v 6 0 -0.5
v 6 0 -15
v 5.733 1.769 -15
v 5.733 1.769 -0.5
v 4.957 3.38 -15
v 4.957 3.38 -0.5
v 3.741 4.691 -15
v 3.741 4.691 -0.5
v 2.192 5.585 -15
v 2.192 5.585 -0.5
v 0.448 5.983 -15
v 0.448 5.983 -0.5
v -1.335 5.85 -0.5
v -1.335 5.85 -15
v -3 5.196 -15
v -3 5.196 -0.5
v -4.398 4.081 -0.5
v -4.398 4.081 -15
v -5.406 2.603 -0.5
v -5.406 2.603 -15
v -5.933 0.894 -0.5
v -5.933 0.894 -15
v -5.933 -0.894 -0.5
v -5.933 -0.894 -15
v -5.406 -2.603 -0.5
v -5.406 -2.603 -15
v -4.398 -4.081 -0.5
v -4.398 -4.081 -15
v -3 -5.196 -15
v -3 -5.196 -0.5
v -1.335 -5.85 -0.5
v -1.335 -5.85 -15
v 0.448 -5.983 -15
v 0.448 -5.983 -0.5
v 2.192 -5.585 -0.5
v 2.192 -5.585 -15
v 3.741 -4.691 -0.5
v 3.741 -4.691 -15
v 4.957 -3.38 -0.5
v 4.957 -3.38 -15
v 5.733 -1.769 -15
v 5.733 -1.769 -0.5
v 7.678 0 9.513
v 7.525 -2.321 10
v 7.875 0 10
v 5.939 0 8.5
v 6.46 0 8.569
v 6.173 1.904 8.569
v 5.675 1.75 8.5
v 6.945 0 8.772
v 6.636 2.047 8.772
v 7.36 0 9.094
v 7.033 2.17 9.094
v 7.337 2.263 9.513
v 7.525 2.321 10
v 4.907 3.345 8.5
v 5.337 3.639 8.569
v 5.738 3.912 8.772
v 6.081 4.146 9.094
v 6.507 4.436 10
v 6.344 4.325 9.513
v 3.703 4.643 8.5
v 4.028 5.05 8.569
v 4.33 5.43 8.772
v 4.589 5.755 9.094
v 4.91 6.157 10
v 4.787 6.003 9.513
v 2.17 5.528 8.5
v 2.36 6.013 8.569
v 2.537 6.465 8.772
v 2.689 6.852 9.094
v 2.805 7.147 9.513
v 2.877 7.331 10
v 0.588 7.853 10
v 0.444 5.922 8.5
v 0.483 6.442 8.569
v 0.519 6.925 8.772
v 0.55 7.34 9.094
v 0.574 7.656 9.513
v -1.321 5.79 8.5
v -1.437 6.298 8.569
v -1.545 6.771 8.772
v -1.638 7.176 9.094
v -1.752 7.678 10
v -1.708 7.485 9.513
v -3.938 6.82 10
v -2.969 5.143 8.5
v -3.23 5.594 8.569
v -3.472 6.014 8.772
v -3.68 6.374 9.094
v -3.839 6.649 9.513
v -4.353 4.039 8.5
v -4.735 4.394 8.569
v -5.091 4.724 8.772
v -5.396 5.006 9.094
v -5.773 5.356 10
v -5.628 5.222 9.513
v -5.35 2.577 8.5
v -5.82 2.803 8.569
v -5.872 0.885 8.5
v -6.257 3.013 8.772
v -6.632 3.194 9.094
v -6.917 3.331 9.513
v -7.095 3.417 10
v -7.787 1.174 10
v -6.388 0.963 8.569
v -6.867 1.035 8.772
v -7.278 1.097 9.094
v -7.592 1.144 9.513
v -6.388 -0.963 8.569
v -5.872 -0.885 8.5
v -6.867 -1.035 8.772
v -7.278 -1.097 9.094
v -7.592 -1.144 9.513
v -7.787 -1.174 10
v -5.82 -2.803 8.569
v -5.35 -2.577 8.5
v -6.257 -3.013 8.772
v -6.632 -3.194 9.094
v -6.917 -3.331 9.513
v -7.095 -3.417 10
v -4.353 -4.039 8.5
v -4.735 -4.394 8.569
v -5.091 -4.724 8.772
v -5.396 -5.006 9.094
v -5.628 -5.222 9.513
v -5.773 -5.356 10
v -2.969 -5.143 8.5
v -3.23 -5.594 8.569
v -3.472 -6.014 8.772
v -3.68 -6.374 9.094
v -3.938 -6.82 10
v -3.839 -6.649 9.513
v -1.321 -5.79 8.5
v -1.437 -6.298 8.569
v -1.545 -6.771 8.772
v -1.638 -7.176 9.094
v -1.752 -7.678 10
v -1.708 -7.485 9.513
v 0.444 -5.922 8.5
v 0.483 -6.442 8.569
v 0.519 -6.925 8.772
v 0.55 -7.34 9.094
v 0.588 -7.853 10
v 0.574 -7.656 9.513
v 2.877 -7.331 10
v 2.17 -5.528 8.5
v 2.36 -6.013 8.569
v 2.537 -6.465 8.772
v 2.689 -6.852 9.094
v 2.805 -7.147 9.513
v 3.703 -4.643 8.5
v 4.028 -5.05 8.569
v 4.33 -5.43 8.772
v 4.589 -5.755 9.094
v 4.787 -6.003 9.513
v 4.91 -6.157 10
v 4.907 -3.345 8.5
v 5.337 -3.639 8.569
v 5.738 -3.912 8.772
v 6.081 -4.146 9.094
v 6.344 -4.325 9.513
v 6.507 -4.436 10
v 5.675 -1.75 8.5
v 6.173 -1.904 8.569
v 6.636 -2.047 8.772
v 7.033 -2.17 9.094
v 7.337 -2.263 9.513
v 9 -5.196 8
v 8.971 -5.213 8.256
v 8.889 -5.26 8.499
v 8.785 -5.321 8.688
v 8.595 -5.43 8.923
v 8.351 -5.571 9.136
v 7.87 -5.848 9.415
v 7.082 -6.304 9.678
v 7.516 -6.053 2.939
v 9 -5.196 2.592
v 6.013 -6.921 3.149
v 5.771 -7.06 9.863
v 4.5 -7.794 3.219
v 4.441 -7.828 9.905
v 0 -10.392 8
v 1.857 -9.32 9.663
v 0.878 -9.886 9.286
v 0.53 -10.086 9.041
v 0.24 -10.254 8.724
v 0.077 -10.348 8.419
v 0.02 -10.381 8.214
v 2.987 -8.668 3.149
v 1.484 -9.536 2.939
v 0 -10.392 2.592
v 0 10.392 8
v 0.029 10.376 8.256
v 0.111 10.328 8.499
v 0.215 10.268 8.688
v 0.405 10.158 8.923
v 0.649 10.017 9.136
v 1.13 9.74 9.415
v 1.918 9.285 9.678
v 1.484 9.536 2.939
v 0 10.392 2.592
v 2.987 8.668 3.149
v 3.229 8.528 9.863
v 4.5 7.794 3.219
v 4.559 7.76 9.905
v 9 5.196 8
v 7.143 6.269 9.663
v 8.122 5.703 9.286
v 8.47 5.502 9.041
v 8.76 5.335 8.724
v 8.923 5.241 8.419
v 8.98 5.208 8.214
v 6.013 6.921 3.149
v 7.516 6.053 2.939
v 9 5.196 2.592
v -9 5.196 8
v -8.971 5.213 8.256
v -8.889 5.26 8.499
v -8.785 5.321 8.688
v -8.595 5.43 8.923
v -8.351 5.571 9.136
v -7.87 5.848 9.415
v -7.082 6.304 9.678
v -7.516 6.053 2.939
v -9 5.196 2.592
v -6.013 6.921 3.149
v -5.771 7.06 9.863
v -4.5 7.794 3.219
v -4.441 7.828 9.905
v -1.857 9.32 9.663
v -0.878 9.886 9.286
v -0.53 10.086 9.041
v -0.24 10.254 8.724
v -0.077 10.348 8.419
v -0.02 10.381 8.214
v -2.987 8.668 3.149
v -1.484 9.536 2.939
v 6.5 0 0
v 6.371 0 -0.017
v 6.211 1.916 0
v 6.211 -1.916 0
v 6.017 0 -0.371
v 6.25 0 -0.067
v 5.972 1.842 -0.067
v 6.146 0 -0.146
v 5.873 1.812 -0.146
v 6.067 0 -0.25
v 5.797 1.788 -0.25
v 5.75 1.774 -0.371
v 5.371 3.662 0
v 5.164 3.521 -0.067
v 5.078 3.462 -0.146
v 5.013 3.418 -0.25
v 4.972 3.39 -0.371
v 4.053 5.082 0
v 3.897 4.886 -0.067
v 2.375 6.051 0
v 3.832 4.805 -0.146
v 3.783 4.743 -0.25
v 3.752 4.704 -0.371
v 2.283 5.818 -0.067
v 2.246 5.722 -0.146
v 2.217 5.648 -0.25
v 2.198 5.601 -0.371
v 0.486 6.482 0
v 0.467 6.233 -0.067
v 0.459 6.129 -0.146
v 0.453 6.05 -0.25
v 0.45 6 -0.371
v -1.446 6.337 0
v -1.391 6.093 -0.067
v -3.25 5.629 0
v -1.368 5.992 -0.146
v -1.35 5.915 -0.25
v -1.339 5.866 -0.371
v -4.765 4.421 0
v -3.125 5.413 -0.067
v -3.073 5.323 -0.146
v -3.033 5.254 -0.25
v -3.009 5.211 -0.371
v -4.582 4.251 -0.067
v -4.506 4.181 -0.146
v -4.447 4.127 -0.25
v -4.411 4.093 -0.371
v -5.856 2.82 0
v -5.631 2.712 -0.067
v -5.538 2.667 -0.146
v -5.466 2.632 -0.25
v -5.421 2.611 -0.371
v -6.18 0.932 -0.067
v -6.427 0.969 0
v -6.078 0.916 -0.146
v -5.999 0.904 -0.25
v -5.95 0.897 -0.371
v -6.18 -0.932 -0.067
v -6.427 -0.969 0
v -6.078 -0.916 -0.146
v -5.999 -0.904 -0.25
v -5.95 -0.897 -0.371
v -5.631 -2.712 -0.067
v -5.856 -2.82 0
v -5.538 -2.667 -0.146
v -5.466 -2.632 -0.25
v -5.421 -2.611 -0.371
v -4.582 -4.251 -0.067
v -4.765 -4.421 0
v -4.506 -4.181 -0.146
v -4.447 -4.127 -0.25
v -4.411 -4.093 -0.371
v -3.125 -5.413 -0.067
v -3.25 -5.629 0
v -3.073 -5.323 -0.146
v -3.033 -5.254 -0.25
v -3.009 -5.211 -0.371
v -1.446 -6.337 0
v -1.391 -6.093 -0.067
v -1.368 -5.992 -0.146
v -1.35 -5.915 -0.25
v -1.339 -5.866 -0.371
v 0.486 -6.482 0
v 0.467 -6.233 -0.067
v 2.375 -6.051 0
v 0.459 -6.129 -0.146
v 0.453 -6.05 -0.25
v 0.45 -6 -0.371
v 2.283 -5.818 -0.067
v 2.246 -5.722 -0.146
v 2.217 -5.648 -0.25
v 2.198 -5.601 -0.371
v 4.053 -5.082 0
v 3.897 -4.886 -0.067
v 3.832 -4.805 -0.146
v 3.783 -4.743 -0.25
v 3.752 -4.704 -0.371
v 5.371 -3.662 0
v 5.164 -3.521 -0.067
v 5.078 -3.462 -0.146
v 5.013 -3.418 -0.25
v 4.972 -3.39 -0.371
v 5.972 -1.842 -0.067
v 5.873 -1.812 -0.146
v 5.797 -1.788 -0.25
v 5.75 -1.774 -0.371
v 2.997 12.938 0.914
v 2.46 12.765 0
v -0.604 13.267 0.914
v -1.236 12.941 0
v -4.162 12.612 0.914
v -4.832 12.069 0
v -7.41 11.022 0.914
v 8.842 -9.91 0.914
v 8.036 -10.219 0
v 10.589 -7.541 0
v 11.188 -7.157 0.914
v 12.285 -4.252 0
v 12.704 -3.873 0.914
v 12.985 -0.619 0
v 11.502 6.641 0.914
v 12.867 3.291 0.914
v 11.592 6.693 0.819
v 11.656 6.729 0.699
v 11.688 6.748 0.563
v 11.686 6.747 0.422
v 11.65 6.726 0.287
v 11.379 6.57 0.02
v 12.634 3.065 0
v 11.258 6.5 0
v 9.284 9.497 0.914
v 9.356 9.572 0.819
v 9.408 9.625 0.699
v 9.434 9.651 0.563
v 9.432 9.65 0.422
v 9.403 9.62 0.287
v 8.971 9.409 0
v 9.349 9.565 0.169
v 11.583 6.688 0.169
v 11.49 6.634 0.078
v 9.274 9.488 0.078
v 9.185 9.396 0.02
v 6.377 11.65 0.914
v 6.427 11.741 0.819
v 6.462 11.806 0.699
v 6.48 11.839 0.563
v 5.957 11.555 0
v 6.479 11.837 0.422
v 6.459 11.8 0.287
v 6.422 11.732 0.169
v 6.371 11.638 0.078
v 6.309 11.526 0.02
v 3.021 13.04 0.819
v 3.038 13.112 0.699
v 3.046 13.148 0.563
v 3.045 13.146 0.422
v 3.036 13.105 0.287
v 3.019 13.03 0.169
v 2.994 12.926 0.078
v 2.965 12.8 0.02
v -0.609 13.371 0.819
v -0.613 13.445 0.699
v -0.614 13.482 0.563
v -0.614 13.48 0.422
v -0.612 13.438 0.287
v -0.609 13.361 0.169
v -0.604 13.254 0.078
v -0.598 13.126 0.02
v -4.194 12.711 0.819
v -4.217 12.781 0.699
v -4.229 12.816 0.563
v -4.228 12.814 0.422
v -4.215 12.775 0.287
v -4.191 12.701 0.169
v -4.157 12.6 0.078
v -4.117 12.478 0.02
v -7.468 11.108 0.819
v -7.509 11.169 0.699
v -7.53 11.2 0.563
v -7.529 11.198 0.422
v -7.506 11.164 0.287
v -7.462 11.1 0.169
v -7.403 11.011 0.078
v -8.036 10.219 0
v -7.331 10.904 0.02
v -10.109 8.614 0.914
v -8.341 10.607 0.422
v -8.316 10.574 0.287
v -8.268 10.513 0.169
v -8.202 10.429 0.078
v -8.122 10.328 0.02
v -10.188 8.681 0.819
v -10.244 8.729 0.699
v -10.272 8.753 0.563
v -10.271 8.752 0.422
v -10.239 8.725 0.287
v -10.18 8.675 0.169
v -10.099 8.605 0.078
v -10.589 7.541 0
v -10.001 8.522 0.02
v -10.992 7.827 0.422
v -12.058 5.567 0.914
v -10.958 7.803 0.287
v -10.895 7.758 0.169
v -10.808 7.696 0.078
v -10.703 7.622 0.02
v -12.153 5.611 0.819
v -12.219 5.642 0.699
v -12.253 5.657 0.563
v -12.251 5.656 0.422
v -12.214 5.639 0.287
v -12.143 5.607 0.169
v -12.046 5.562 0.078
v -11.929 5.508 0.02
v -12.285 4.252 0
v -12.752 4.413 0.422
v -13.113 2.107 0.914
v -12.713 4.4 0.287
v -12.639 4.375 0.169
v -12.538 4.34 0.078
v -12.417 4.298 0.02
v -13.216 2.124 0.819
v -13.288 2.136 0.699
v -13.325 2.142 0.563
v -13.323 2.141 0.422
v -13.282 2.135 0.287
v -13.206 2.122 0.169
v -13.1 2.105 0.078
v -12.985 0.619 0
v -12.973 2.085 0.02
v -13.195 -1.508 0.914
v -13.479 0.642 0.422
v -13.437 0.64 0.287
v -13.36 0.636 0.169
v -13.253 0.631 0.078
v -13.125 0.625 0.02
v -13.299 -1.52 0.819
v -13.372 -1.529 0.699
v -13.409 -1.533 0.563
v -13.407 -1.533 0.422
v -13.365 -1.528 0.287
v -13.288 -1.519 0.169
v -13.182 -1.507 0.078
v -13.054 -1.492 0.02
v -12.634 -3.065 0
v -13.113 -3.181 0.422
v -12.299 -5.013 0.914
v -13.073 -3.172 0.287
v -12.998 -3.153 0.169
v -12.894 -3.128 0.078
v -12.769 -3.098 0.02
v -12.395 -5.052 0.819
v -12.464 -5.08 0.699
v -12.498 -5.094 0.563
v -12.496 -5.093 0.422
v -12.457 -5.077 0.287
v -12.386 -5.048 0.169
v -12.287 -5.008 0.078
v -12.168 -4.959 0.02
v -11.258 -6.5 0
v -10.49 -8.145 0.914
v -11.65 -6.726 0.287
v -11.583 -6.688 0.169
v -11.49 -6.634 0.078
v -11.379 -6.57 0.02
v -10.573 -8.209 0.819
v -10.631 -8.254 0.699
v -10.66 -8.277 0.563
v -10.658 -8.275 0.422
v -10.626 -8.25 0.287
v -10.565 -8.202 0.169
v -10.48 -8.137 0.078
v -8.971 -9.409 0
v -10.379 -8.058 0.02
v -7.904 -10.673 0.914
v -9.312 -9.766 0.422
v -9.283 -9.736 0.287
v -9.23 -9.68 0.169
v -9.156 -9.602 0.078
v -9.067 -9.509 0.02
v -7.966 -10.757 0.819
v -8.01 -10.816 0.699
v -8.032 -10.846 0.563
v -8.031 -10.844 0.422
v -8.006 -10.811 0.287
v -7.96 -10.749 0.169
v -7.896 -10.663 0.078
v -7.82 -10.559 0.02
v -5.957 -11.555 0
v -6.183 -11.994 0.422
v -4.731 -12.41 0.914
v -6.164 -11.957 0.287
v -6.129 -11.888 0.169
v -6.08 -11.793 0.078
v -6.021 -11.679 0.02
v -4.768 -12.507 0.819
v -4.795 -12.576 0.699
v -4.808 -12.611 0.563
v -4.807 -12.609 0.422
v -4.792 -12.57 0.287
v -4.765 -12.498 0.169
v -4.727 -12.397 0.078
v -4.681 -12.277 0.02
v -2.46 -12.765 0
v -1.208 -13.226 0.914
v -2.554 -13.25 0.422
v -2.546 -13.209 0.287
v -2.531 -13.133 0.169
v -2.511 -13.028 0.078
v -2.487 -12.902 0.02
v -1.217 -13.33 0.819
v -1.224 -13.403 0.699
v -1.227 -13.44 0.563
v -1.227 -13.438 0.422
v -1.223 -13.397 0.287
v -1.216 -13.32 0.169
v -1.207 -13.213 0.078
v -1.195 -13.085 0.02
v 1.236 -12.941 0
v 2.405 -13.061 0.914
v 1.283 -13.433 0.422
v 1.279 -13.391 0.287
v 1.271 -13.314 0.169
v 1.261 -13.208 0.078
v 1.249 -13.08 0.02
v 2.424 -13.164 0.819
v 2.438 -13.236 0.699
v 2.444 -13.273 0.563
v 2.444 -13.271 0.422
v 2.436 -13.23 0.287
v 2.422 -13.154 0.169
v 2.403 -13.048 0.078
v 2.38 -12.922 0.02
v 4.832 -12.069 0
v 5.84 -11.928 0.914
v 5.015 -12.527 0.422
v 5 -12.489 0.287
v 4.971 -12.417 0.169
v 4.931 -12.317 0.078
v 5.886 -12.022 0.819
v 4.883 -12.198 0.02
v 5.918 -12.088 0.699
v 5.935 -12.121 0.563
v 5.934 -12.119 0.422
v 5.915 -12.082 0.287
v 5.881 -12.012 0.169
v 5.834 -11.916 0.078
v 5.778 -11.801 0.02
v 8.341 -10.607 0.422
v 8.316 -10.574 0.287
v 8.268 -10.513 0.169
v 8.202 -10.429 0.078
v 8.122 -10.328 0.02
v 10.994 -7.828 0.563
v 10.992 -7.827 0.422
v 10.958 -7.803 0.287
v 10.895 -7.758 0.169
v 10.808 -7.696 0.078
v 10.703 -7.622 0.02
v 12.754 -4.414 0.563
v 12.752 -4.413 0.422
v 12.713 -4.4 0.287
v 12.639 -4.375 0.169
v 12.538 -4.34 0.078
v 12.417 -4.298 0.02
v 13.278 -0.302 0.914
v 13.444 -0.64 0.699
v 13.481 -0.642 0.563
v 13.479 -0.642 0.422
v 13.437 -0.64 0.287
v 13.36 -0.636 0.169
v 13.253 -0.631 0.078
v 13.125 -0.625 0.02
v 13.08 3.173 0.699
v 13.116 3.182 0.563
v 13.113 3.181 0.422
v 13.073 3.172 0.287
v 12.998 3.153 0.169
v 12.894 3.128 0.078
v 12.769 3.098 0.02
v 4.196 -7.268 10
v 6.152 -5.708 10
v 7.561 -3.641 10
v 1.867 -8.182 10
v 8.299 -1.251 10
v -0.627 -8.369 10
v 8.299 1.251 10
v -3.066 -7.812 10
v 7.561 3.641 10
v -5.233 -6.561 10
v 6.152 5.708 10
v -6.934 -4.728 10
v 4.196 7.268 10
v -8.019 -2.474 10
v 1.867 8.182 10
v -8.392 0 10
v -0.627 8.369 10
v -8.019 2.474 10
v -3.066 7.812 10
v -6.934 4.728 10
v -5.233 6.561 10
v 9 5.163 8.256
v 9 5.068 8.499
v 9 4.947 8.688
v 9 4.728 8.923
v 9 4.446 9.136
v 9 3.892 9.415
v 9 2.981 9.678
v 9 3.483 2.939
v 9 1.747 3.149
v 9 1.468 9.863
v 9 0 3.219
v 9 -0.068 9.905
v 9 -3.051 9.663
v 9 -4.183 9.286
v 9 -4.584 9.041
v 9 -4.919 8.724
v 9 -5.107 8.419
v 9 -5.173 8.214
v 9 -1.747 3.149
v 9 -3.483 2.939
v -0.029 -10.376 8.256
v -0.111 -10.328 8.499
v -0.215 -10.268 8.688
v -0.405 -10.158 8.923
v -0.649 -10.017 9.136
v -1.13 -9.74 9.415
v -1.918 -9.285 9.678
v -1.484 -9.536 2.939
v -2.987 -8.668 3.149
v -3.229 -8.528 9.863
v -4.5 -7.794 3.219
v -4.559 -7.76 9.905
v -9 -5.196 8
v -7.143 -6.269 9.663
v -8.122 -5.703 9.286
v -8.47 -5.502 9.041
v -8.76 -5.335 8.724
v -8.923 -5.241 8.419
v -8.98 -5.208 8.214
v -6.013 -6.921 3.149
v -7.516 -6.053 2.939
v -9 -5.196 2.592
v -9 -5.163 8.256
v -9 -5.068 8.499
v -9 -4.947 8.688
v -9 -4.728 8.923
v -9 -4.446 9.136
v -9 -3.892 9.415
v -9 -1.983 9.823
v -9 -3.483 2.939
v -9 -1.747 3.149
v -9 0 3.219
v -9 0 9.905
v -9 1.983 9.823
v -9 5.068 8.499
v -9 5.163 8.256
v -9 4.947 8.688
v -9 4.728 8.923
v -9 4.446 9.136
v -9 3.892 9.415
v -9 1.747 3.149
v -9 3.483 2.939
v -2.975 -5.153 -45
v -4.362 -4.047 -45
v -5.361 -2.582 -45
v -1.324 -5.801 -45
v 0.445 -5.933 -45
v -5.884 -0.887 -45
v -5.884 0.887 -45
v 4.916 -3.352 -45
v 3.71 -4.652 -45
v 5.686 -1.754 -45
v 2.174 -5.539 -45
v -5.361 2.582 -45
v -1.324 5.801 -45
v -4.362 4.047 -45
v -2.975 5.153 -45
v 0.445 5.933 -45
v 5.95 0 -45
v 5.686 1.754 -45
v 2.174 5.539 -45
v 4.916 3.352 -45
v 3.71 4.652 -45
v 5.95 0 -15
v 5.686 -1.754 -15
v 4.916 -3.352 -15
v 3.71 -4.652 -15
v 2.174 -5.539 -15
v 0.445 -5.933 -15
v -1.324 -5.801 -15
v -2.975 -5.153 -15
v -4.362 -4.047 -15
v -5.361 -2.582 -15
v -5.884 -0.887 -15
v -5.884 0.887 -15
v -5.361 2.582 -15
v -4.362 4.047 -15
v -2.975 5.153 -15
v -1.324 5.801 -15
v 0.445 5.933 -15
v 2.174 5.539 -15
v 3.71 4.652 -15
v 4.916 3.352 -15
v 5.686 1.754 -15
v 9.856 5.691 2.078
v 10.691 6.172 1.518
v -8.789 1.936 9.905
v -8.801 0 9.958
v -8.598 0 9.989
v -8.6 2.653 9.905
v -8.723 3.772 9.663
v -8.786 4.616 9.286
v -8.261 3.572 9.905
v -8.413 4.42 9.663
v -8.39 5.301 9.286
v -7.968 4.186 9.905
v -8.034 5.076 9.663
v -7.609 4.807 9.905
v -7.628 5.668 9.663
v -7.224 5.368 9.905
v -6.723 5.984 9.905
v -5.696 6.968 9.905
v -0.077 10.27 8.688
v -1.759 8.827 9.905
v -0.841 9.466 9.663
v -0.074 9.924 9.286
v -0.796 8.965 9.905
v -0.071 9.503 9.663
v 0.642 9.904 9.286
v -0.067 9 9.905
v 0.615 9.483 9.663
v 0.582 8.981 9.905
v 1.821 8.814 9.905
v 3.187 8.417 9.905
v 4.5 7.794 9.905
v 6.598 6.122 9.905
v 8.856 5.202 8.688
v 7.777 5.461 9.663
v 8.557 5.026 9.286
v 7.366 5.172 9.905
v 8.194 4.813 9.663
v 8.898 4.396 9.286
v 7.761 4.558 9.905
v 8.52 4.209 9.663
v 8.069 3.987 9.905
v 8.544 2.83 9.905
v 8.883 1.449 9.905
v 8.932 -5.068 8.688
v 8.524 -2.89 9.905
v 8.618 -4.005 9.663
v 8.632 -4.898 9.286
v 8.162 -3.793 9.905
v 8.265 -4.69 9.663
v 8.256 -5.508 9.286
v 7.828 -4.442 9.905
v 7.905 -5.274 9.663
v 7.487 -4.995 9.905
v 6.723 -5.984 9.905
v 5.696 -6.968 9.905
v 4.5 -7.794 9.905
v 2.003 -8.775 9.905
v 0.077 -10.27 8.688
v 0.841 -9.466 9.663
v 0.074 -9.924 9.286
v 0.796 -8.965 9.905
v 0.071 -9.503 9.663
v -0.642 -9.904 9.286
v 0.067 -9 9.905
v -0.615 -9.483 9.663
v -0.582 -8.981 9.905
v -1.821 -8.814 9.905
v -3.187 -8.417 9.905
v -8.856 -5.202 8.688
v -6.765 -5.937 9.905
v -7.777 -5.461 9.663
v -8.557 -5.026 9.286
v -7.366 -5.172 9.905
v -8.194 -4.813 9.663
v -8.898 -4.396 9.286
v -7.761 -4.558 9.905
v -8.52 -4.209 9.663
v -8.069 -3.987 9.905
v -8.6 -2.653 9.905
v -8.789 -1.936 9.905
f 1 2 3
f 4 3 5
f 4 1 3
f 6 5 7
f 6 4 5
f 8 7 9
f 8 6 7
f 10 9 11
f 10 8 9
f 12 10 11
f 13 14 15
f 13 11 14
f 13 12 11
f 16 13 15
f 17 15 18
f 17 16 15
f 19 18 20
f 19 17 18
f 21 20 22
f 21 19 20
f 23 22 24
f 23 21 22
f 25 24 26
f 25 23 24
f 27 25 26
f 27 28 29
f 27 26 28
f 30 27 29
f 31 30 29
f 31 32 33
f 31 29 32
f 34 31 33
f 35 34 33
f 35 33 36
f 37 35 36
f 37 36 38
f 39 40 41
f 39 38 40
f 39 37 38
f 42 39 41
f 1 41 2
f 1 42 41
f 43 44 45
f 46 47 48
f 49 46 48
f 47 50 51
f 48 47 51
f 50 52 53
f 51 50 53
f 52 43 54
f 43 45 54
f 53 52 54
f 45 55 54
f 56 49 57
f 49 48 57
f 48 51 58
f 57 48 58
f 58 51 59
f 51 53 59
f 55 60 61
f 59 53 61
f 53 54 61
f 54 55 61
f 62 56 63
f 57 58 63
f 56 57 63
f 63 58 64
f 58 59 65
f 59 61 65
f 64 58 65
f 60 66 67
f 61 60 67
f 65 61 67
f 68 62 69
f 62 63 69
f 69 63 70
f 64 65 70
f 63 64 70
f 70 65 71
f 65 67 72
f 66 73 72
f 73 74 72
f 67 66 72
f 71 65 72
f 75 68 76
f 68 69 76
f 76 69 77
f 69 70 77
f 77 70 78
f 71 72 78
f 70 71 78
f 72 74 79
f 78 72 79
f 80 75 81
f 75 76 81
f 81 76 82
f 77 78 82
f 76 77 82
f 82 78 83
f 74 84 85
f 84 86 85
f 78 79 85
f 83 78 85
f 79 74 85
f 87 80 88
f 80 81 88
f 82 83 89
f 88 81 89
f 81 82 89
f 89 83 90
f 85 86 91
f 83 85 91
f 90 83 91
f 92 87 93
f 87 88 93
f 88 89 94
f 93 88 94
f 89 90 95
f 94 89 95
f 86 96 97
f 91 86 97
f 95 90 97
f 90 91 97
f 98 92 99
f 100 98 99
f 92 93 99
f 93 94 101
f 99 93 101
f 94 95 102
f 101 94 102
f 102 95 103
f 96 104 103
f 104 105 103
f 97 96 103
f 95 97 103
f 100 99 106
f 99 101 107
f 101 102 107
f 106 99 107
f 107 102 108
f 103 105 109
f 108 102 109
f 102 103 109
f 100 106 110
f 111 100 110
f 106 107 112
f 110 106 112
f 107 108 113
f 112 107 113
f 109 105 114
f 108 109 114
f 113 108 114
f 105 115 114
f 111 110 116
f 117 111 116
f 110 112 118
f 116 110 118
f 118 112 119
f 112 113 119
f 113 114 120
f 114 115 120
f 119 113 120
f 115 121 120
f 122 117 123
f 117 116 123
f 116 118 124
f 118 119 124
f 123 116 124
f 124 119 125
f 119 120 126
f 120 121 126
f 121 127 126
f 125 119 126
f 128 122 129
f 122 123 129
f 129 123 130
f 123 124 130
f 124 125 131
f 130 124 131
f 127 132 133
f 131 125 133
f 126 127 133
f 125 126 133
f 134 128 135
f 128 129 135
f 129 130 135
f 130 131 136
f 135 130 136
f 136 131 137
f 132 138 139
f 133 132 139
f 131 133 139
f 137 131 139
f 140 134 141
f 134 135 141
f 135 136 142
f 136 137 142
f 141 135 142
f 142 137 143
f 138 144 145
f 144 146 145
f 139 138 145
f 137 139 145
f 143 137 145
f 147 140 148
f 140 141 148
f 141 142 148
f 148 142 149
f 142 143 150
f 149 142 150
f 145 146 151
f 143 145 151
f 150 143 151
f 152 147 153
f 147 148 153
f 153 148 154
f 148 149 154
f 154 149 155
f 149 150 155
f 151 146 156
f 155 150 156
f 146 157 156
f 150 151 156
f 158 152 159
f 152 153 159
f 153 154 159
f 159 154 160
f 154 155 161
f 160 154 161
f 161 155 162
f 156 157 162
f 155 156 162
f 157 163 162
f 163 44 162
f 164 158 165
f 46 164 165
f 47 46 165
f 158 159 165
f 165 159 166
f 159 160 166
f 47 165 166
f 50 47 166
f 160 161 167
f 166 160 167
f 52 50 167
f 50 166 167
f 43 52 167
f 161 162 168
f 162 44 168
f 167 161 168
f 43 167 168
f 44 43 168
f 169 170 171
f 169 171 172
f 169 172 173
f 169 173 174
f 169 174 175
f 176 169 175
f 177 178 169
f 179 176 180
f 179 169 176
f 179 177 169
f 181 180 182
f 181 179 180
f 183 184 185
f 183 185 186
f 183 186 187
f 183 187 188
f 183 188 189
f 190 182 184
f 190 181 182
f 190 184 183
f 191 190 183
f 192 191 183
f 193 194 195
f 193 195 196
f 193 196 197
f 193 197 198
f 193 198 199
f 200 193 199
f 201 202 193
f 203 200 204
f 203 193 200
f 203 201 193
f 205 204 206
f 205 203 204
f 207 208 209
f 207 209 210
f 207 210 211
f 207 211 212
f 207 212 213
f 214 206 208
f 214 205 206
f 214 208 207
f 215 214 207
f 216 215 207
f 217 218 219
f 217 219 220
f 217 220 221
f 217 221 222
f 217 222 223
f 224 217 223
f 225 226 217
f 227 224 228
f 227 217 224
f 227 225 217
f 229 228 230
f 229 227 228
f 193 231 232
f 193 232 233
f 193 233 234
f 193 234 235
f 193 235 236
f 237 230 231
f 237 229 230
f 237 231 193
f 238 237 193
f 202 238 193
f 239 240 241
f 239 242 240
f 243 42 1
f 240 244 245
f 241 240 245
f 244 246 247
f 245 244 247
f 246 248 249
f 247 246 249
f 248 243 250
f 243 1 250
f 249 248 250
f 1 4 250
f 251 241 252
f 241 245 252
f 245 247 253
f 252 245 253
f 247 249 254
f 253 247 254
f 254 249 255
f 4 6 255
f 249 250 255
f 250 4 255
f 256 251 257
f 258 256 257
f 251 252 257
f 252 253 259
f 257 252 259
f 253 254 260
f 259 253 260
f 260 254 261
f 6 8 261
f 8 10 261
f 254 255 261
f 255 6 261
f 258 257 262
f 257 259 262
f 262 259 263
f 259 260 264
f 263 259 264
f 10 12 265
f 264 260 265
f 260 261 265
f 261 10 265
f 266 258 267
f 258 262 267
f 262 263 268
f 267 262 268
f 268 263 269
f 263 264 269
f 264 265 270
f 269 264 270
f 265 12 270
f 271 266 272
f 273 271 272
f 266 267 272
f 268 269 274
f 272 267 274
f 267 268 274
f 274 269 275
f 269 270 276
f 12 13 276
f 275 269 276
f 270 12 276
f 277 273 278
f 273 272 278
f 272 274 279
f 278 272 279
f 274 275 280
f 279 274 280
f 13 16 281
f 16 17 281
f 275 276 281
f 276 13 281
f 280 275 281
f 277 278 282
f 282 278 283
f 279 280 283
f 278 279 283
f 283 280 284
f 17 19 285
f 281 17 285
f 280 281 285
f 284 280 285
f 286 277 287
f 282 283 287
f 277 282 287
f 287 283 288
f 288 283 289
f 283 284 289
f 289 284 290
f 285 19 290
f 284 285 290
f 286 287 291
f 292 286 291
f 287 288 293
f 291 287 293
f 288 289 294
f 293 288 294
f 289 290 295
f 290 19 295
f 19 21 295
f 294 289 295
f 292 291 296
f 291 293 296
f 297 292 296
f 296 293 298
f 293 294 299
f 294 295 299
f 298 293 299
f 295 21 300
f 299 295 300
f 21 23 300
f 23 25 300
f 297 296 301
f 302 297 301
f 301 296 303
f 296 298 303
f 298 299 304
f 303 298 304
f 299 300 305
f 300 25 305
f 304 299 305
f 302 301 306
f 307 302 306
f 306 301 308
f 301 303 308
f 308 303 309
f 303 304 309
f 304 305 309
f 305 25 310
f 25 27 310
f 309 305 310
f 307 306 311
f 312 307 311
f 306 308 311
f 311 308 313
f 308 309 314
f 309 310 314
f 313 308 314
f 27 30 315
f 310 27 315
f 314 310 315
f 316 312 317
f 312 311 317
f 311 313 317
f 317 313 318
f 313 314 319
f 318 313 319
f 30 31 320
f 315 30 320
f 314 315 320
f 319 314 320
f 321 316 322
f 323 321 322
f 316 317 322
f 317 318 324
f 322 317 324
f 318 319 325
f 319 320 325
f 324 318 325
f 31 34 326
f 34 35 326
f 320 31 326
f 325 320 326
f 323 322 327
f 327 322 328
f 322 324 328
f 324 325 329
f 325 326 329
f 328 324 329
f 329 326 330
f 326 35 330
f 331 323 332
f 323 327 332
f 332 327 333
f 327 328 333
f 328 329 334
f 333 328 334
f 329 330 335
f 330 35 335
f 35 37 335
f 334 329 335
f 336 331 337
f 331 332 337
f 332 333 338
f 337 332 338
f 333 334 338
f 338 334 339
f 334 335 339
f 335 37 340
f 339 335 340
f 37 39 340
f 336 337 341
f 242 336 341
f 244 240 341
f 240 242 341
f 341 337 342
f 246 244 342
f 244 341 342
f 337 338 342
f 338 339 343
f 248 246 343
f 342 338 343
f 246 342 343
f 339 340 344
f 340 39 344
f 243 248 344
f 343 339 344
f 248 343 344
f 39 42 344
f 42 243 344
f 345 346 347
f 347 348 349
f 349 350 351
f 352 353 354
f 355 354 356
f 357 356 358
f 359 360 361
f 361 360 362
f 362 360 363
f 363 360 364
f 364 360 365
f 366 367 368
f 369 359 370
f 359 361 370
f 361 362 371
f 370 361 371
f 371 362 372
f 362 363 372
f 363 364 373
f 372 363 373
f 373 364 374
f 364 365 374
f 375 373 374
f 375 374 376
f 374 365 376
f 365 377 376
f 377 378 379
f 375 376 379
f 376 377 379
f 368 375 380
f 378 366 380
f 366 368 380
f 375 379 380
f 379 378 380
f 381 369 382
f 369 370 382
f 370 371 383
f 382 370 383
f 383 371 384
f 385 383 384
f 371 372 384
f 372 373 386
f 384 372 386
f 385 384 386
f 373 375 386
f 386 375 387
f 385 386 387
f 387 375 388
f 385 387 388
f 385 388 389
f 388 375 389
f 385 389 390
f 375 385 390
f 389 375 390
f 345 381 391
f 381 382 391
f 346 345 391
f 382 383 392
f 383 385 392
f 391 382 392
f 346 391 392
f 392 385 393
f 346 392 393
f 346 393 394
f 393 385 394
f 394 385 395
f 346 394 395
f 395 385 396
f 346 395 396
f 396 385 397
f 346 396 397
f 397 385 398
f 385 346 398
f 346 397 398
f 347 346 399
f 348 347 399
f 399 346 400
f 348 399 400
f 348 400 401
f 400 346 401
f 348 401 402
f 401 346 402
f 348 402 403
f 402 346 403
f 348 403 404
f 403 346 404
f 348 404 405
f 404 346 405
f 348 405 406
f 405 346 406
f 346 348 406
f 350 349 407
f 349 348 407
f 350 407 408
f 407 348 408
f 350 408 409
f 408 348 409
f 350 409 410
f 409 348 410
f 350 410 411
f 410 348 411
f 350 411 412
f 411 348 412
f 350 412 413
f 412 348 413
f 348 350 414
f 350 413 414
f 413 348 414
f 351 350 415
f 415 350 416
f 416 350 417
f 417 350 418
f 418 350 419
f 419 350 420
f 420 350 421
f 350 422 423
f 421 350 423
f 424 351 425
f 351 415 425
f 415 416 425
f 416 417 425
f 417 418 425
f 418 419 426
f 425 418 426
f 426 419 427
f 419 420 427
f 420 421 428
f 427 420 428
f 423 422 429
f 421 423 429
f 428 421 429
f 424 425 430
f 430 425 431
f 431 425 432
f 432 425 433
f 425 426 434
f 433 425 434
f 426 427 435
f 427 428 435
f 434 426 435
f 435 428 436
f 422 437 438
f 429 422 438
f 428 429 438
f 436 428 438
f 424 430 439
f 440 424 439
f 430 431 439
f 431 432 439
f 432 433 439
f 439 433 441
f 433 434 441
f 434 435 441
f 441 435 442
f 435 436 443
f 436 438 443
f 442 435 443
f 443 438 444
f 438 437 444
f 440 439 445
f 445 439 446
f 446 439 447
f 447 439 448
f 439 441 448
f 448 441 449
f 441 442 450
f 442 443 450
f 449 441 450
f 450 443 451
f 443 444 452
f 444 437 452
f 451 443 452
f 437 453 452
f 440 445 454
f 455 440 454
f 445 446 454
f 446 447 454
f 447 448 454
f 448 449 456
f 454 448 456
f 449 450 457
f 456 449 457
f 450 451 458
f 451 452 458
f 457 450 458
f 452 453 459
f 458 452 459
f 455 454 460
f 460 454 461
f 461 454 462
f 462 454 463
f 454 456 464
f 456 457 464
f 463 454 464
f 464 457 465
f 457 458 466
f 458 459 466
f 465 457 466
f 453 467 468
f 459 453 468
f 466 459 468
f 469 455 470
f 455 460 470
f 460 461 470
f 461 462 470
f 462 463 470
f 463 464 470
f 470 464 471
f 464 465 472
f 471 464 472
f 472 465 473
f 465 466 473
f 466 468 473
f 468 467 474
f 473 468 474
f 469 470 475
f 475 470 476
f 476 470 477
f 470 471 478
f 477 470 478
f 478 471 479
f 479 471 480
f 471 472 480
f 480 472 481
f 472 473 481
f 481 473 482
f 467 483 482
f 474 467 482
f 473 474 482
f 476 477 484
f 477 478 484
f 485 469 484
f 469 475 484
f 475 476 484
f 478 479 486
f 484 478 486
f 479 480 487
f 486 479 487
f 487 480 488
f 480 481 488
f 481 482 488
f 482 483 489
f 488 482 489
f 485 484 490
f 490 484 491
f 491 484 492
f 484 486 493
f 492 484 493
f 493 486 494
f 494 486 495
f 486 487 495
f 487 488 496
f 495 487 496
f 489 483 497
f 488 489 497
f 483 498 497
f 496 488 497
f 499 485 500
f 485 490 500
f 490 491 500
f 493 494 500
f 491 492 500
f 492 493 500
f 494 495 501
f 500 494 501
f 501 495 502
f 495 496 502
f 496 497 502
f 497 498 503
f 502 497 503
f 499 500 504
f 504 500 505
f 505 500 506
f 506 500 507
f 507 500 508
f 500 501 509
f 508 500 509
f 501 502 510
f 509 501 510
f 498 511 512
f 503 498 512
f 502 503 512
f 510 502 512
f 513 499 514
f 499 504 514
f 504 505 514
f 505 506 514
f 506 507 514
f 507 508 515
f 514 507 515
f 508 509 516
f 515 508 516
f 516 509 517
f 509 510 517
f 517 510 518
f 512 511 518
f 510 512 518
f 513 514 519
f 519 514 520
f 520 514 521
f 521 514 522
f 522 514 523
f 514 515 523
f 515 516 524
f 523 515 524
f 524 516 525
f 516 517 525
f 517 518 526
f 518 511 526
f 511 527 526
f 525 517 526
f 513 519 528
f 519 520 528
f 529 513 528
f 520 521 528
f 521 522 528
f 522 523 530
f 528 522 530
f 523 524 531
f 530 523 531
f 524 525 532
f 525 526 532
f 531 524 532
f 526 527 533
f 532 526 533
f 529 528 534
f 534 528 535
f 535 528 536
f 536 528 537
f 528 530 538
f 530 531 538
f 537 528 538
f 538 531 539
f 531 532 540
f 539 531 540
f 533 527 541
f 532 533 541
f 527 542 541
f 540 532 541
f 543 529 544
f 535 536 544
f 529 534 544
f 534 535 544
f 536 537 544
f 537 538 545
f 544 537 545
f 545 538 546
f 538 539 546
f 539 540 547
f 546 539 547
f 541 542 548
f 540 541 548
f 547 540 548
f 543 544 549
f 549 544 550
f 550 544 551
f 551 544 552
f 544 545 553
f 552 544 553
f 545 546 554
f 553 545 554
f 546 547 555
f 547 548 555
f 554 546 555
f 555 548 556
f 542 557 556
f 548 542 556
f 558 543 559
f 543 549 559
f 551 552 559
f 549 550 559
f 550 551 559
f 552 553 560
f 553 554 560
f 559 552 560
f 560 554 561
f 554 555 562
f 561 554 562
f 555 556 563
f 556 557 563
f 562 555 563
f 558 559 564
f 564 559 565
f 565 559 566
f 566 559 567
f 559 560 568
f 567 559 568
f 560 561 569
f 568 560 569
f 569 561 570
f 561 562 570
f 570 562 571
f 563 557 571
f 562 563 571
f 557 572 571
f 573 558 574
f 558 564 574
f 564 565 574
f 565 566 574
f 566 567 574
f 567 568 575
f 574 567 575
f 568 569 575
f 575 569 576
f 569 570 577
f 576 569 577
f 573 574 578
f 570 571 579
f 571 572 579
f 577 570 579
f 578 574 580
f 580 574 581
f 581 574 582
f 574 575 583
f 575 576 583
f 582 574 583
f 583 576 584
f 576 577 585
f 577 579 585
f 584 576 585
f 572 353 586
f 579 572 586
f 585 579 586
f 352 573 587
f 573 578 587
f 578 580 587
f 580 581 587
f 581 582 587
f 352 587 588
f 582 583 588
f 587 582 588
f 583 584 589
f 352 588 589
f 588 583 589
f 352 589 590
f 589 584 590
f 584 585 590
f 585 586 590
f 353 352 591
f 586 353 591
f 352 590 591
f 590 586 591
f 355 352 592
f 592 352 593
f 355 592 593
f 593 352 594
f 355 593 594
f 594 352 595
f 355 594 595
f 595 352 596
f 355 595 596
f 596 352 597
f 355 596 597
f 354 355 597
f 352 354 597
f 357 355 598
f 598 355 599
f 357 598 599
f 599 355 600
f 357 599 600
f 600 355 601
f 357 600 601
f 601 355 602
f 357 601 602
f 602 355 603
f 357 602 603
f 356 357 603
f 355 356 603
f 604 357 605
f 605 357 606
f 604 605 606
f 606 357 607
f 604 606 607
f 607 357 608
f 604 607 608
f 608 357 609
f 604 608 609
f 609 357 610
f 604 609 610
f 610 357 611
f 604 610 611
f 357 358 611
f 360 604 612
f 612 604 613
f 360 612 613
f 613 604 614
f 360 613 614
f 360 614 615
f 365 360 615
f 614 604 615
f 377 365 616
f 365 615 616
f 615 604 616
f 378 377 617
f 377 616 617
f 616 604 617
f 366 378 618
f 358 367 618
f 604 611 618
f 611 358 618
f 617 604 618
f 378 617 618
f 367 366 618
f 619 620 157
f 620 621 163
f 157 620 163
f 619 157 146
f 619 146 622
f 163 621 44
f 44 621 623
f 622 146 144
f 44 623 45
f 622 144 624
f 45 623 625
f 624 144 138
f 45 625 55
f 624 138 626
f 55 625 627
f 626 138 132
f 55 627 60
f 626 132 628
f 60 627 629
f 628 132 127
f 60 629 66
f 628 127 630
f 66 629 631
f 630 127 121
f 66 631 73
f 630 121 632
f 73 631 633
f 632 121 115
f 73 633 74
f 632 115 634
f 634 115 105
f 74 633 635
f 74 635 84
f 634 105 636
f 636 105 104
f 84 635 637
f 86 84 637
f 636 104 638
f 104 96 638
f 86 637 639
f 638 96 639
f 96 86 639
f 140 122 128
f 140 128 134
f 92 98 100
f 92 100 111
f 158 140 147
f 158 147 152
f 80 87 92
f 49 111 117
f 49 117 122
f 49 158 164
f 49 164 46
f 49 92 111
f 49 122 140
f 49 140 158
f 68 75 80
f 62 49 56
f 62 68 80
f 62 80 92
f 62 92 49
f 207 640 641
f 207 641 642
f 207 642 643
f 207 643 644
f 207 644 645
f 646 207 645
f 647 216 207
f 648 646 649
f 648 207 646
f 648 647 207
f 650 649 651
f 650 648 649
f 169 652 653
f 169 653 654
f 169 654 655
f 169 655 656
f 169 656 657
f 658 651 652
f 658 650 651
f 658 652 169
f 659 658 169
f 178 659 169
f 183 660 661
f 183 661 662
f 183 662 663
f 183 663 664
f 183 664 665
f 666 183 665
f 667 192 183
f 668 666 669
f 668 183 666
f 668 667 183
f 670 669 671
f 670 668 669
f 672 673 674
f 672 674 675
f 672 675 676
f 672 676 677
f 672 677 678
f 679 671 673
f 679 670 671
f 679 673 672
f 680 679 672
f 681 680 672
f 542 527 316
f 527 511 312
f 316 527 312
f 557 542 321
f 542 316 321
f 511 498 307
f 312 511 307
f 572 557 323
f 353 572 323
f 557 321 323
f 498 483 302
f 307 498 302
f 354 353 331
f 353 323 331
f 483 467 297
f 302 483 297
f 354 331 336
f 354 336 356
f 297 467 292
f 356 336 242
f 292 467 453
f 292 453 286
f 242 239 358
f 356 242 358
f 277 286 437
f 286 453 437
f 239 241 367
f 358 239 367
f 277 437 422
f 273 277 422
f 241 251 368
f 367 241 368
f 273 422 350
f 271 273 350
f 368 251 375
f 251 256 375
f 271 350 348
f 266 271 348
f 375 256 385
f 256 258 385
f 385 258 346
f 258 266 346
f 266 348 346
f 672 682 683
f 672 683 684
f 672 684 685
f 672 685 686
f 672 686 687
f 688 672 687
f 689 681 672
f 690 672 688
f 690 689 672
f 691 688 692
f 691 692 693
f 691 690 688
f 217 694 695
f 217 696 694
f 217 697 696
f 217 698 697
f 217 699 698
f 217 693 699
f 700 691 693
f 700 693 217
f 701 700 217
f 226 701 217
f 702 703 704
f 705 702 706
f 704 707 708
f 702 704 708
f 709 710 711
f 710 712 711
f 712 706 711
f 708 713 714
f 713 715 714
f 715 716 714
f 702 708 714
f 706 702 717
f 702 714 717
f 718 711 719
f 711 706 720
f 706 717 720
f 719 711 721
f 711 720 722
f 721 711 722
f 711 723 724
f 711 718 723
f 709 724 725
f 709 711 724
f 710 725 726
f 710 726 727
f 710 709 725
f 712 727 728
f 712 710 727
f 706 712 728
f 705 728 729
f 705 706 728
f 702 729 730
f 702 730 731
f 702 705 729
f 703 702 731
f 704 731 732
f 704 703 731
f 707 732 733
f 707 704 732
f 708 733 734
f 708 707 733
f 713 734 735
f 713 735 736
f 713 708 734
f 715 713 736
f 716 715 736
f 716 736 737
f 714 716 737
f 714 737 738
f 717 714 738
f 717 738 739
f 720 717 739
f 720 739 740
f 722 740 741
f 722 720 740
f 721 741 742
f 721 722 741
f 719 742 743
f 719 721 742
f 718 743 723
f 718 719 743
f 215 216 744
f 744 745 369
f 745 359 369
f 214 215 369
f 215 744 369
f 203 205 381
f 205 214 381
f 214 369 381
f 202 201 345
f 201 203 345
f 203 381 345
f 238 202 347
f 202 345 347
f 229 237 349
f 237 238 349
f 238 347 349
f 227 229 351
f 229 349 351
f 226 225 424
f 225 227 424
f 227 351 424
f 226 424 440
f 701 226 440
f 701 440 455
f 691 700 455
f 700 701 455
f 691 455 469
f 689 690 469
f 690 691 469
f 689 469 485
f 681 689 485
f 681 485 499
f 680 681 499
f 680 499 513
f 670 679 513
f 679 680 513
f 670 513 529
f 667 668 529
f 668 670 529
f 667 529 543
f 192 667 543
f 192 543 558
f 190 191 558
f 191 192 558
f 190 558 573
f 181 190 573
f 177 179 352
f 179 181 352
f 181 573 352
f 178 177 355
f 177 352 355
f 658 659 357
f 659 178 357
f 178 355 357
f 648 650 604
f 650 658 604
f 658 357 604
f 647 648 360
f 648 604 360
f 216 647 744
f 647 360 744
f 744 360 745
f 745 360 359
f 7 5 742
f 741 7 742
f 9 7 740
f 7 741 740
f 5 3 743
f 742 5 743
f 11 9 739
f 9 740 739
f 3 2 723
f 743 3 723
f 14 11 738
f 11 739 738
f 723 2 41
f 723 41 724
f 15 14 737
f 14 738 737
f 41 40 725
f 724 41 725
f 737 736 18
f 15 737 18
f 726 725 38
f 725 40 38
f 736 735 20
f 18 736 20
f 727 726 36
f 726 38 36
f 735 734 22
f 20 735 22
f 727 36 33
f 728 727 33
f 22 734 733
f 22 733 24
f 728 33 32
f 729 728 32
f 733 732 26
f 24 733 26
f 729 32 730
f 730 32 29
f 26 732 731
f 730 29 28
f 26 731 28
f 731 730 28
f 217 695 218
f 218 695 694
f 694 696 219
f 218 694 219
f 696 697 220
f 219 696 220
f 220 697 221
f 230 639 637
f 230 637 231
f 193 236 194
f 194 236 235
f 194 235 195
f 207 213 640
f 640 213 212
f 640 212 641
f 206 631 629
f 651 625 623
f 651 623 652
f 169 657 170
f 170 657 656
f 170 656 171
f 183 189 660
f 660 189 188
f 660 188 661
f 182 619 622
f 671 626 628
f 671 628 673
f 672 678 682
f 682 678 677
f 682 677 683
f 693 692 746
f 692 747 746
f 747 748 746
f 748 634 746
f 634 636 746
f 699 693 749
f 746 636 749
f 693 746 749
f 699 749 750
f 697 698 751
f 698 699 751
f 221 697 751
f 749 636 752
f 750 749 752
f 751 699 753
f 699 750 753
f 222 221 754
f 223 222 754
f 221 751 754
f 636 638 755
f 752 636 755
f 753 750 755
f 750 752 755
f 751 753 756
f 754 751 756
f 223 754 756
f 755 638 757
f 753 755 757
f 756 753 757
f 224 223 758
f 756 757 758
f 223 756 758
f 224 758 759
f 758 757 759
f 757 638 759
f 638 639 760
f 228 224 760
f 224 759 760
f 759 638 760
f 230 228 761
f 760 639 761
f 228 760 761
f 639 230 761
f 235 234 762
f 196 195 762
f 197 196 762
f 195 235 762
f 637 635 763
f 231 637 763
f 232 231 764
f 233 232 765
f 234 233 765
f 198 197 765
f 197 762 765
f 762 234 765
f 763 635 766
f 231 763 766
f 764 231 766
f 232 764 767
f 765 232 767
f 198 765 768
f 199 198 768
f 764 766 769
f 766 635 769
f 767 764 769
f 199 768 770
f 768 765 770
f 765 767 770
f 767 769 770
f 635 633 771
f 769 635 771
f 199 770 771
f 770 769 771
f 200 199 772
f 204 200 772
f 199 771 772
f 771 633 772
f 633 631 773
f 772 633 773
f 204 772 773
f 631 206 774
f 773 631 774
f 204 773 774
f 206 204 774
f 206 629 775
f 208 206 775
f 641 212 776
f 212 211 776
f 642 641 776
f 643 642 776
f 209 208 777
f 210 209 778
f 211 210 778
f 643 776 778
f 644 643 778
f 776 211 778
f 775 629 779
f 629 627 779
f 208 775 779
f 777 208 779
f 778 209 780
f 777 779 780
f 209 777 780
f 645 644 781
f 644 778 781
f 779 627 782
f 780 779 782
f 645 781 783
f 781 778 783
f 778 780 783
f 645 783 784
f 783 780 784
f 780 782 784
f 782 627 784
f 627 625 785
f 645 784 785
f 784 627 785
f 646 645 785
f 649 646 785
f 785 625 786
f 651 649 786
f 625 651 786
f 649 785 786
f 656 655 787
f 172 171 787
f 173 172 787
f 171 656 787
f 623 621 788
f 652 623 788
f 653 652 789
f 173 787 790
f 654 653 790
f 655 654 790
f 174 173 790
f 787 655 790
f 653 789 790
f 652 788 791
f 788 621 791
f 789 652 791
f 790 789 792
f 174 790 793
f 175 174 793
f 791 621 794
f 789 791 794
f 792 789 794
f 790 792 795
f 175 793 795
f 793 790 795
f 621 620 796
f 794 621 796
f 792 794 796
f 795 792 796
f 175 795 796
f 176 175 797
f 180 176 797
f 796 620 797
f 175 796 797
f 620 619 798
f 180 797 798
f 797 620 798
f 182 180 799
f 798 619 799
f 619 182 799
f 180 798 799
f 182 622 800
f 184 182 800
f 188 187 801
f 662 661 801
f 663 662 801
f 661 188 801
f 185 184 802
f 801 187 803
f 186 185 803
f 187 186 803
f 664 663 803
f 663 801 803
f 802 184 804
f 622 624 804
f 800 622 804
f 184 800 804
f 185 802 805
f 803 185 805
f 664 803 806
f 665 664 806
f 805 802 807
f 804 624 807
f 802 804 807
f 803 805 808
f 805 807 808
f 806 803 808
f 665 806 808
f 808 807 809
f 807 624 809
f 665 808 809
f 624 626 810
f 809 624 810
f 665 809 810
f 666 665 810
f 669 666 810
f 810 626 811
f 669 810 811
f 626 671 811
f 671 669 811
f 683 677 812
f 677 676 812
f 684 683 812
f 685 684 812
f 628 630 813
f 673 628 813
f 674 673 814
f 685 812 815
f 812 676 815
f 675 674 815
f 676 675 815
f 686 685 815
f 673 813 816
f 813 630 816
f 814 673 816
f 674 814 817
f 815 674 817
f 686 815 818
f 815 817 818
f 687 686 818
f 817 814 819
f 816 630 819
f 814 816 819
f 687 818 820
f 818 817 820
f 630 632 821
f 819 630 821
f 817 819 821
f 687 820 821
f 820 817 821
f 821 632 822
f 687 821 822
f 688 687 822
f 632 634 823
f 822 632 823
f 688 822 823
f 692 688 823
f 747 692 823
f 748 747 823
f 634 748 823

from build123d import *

# Parameters (mm, degrees)
HEAD_DEPTH     = 10
SHANK_SKETCH_R = 6
SHANK_DEPTH    = 45
SKETCH6_R      = 7.875
HEAD_CUT_DEPTH = 1.5
FILLET1_R      = 2
FILLET2_R      = 0.5
THREAD_END_W   = 30
THREAD_END_H   = 0.05


with BuildPart() as part:
    # Head Sketch → Head (new body)
    with BuildSketch(Plane.XY):
        Polygon((0, 10.392304845), (9, 5.196152423), (9, -5.196152423), (0, -10.392304845), (-9, -5.196152423), (-9, 5.196152423), align=None)
    extrude(amount=HEAD_DEPTH)

    # Shank Sketch → Shank (add)
    with BuildSketch(Plane.XY):
        Circle(SHANK_SKETCH_R)
    extrude(amount=-SHANK_DEPTH)

    # Sketch3 → Flange (revolve)
    with BuildSketch(Plane(origin=(0, 0, 0), x_dir=(-1, 0, 0), z_dir=(0, 1, 0)), mode=Mode.PRIVATE) as flange_sk:
        with BuildLine():
            Line((-13, 0), (0, 0))
            Line((0, 0), (0, 5))
            ThreePointArc((0, 5), (-6.947778179, 3.955279081), (-13.281081081, 0.913513514))
            ThreePointArc((-13.281081081, 0.913513514), (-13.477889504, 0.352957076), (-13, 0))
        make_face()
    revolve(flange_sk.sketch.rotate(Axis((0, 0, 0), (0, 0, 1)), 30), axis=Axis((0, 0, 0), (0, 0, 1)))

    # Sketch5 → Head Trim (revolve, cut)
    with BuildSketch(Plane(origin=(0, 0, 0), x_dir=(0, 0, -1), z_dir=(1, 0, 0)), mode=Mode.PRIVATE) as head_trim_sk:
        with BuildLine():
            Line((-10, -8.392304845), (-10, -10.392304845))
            Line((-10, -10.392304845), (-8, -10.392304845))
            ThreePointArc((-8, -10.392304845), (-9.414213562, -9.806518408), (-10, -8.392304845))
        make_face()
    revolve(head_trim_sk.sketch.rotate(Axis((0, 0, 15.085599173), (0, 0, -1)), 90), axis=Axis((0, 0, 15.085599173), (0, 0, -1)), mode=Mode.SUBTRACT)

    # Sketch6 → Head Cut (cut)
    with BuildSketch(Plane.XY.offset(10)):
        Circle(SKETCH6_R)
    extrude(amount=-HEAD_CUT_DEPTH, mode=Mode.SUBTRACT)

    # Fillet1
    # the kernel refuses this fillet: 2 mm, written as the material it adds along each edge
    with BuildSketch(Plane(origin=(0, 0, 8.5), x_dir=(1, 0, 0), z_dir=(0, -1, 0))) as fillet1_piece_1:
        with BuildLine():
            CenterArc((5.938508327, 2), FILLET1_R, 270, 75.522487814)
            Line((5.938508327, 0), (5.938508327, -0.04))
            Line((5.938508327, -0.04), (7.875, -0.04))
            Line((7.875, -0.04), (7.915, 0))
            ThreePointArc((7.915, 0), (7.915, 0.75), (7.913729833, 1.49))
            Line((7.913729833, 1.49), (7.875, 1.5))
        make_face()
    revolve(axis=Axis((0, 0, 8.5), (0, 0, 1)))

    # Fillet2
    fillet2_edges = [part.edges().sort_by_distance(p)[0] for p in [
        (-6, 0, 0),
    ]]
    fillet(fillet2_edges, radius=FILLET2_R)

    # Thread End → Thread Cut (revolve, cut)
    with BuildSketch(Plane(origin=(0, 0, 0), x_dir=(0, 0, -1), z_dir=(1, 0, 0)), mode=Mode.PRIVATE) as thread_cut_sk:
        with Locations((30, 5.975)):
            Rectangle(THREAD_END_W, THREAD_END_H)
    revolve(thread_cut_sk.sketch.rotate(Axis((0, 0, -21.551935625), (0, 0, -1)), 90), axis=Axis((0, 0, -21.551935625), (0, 0, -1)), mode=Mode.SUBTRACT)


solid = part.part
